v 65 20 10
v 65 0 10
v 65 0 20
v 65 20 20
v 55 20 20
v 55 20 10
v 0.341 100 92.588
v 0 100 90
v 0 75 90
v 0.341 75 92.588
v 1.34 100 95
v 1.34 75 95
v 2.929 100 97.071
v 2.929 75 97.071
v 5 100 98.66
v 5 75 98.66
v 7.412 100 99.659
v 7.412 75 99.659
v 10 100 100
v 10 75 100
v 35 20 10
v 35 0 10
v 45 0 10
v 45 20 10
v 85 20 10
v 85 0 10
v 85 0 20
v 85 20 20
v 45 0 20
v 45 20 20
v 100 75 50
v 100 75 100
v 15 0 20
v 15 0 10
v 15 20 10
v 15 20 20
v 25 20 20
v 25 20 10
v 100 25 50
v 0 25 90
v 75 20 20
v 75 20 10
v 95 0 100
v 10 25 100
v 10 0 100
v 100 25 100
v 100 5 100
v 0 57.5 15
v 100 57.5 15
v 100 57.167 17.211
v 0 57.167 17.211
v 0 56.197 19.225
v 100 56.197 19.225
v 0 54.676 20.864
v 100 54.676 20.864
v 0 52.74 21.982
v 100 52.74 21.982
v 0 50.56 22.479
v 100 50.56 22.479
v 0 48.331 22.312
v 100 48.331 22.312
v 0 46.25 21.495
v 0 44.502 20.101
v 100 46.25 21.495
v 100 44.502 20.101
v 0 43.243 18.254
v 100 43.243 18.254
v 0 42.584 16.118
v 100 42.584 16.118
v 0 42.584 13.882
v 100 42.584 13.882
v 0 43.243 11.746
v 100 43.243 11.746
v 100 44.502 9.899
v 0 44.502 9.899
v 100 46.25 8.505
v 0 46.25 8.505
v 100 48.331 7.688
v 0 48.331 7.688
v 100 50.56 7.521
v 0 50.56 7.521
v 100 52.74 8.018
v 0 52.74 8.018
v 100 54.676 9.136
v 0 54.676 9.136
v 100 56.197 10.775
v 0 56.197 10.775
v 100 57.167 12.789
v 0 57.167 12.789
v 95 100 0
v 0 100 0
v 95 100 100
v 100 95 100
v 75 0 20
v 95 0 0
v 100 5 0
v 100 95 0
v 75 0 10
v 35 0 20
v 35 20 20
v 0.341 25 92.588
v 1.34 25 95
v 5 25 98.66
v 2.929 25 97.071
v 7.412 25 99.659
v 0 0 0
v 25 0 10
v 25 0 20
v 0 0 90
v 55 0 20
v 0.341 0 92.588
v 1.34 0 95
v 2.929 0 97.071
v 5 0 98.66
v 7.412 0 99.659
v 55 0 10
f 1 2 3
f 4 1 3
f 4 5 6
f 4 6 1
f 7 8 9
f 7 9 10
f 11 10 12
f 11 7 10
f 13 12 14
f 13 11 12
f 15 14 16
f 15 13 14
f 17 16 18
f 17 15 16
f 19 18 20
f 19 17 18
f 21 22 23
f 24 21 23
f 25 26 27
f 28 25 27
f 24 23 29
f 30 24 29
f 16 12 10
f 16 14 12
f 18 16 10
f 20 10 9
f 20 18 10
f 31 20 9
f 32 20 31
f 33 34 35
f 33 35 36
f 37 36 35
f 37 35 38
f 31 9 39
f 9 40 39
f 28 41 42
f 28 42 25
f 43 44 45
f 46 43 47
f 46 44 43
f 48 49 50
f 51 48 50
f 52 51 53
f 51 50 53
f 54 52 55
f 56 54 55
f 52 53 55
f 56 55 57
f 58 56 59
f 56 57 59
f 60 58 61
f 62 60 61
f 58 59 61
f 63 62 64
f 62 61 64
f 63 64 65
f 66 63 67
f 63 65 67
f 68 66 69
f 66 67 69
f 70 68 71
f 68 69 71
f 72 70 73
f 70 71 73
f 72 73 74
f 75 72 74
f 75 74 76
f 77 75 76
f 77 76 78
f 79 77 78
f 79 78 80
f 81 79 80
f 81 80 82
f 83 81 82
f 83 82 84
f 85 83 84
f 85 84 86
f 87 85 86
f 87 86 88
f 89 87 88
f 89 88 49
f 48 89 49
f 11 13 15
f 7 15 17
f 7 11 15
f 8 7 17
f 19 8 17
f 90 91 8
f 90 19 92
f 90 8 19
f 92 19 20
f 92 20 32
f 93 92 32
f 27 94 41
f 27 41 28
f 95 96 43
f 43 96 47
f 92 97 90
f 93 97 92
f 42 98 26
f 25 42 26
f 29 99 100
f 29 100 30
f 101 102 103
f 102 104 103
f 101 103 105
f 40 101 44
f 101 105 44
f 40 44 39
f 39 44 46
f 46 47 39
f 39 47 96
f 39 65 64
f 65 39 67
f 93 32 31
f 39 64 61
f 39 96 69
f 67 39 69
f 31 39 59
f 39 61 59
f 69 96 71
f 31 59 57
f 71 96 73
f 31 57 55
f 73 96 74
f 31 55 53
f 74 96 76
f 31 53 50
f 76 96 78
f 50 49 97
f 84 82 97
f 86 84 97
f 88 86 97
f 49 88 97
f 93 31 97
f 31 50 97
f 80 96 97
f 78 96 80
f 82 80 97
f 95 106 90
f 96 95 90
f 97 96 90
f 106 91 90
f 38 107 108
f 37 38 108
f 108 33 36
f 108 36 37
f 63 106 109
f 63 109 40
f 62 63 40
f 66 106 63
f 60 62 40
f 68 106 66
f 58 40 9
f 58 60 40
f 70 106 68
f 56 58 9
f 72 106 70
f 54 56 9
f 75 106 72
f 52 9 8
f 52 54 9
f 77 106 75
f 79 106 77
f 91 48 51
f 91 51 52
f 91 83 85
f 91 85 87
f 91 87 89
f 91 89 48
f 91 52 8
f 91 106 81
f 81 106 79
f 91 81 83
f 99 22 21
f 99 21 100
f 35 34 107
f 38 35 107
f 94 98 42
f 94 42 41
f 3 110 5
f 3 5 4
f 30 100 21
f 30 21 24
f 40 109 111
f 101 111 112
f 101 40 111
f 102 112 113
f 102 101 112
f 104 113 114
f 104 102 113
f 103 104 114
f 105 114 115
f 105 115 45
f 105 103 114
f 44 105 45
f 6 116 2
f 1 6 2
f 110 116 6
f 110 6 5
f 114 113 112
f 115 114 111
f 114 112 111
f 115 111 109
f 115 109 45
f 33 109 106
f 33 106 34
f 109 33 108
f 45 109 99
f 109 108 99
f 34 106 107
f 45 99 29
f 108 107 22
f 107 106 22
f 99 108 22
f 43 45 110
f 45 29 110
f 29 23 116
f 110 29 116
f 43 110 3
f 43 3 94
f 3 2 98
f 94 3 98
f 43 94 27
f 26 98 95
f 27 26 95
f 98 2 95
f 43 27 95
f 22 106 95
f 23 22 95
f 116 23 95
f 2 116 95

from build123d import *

# Parameters (mm, degrees)
F0_W      = 100
F0_H      = 100
F1_DEPTH  = 100
F3_R      = 10
F4_W      = 10
F4_H      = 10
F5_DEPTH  = 20
F6_R      = 7.5
F7_DEPTH  = 100.001
F10_DEPTH = 25
F11_SIZE  = 5


with BuildPart() as f1:
    # F0 (on Top) → F1 (new body)
    with BuildSketch(Plane.XY):
        with Locations((50, 50)):
            Rectangle(F0_W, F0_H)
    extrude(amount=F1_DEPTH)

    # F3
    f3_edges = [f1.edges().sort_by_distance(p)[0] for p in [
        (0, 50, 100),
    ]]
    fillet(f3_edges, radius=F3_R)

    # F4 (on face) → F5 (cut)
    with BuildSketch(Plane.XZ):
        with Locations((20, 15)):
            Rectangle(F4_W, F4_H)
        with Locations((40, 15)):
            Rectangle(F4_W, F4_H)
        with Locations((60, 15)):
            Rectangle(F4_W, F4_H)
        with Locations((80, 15)):
            Rectangle(F4_W, F4_H)
    extrude(amount=-F5_DEPTH, mode=Mode.SUBTRACT)

    # F6 (on face) → F7 (cut, through all)
    with BuildSketch(Plane.YZ.offset(100)):
        with Locations((50, 15)):
            Circle(F6_R)
    extrude(amount=-F7_DEPTH, mode=Mode.SUBTRACT)

    # F9 (on offset) → F10 (cut, symmetric)
    with BuildSketch(Plane.XZ.offset(-50)):
        Polygon((0, 90), (100, 50), (100, 100), (0, 100), align=None)
    extrude(amount=F10_DEPTH, both=True, mode=Mode.SUBTRACT)

    # F11
    f11_edges = [f1.edges().sort_by_distance(p)[0] for p in [
        (100, 0, 50),
        (100, 100, 50),
    ]]
    chamfer(f11_edges, length=F11_SIZE)


solid = f1.part
